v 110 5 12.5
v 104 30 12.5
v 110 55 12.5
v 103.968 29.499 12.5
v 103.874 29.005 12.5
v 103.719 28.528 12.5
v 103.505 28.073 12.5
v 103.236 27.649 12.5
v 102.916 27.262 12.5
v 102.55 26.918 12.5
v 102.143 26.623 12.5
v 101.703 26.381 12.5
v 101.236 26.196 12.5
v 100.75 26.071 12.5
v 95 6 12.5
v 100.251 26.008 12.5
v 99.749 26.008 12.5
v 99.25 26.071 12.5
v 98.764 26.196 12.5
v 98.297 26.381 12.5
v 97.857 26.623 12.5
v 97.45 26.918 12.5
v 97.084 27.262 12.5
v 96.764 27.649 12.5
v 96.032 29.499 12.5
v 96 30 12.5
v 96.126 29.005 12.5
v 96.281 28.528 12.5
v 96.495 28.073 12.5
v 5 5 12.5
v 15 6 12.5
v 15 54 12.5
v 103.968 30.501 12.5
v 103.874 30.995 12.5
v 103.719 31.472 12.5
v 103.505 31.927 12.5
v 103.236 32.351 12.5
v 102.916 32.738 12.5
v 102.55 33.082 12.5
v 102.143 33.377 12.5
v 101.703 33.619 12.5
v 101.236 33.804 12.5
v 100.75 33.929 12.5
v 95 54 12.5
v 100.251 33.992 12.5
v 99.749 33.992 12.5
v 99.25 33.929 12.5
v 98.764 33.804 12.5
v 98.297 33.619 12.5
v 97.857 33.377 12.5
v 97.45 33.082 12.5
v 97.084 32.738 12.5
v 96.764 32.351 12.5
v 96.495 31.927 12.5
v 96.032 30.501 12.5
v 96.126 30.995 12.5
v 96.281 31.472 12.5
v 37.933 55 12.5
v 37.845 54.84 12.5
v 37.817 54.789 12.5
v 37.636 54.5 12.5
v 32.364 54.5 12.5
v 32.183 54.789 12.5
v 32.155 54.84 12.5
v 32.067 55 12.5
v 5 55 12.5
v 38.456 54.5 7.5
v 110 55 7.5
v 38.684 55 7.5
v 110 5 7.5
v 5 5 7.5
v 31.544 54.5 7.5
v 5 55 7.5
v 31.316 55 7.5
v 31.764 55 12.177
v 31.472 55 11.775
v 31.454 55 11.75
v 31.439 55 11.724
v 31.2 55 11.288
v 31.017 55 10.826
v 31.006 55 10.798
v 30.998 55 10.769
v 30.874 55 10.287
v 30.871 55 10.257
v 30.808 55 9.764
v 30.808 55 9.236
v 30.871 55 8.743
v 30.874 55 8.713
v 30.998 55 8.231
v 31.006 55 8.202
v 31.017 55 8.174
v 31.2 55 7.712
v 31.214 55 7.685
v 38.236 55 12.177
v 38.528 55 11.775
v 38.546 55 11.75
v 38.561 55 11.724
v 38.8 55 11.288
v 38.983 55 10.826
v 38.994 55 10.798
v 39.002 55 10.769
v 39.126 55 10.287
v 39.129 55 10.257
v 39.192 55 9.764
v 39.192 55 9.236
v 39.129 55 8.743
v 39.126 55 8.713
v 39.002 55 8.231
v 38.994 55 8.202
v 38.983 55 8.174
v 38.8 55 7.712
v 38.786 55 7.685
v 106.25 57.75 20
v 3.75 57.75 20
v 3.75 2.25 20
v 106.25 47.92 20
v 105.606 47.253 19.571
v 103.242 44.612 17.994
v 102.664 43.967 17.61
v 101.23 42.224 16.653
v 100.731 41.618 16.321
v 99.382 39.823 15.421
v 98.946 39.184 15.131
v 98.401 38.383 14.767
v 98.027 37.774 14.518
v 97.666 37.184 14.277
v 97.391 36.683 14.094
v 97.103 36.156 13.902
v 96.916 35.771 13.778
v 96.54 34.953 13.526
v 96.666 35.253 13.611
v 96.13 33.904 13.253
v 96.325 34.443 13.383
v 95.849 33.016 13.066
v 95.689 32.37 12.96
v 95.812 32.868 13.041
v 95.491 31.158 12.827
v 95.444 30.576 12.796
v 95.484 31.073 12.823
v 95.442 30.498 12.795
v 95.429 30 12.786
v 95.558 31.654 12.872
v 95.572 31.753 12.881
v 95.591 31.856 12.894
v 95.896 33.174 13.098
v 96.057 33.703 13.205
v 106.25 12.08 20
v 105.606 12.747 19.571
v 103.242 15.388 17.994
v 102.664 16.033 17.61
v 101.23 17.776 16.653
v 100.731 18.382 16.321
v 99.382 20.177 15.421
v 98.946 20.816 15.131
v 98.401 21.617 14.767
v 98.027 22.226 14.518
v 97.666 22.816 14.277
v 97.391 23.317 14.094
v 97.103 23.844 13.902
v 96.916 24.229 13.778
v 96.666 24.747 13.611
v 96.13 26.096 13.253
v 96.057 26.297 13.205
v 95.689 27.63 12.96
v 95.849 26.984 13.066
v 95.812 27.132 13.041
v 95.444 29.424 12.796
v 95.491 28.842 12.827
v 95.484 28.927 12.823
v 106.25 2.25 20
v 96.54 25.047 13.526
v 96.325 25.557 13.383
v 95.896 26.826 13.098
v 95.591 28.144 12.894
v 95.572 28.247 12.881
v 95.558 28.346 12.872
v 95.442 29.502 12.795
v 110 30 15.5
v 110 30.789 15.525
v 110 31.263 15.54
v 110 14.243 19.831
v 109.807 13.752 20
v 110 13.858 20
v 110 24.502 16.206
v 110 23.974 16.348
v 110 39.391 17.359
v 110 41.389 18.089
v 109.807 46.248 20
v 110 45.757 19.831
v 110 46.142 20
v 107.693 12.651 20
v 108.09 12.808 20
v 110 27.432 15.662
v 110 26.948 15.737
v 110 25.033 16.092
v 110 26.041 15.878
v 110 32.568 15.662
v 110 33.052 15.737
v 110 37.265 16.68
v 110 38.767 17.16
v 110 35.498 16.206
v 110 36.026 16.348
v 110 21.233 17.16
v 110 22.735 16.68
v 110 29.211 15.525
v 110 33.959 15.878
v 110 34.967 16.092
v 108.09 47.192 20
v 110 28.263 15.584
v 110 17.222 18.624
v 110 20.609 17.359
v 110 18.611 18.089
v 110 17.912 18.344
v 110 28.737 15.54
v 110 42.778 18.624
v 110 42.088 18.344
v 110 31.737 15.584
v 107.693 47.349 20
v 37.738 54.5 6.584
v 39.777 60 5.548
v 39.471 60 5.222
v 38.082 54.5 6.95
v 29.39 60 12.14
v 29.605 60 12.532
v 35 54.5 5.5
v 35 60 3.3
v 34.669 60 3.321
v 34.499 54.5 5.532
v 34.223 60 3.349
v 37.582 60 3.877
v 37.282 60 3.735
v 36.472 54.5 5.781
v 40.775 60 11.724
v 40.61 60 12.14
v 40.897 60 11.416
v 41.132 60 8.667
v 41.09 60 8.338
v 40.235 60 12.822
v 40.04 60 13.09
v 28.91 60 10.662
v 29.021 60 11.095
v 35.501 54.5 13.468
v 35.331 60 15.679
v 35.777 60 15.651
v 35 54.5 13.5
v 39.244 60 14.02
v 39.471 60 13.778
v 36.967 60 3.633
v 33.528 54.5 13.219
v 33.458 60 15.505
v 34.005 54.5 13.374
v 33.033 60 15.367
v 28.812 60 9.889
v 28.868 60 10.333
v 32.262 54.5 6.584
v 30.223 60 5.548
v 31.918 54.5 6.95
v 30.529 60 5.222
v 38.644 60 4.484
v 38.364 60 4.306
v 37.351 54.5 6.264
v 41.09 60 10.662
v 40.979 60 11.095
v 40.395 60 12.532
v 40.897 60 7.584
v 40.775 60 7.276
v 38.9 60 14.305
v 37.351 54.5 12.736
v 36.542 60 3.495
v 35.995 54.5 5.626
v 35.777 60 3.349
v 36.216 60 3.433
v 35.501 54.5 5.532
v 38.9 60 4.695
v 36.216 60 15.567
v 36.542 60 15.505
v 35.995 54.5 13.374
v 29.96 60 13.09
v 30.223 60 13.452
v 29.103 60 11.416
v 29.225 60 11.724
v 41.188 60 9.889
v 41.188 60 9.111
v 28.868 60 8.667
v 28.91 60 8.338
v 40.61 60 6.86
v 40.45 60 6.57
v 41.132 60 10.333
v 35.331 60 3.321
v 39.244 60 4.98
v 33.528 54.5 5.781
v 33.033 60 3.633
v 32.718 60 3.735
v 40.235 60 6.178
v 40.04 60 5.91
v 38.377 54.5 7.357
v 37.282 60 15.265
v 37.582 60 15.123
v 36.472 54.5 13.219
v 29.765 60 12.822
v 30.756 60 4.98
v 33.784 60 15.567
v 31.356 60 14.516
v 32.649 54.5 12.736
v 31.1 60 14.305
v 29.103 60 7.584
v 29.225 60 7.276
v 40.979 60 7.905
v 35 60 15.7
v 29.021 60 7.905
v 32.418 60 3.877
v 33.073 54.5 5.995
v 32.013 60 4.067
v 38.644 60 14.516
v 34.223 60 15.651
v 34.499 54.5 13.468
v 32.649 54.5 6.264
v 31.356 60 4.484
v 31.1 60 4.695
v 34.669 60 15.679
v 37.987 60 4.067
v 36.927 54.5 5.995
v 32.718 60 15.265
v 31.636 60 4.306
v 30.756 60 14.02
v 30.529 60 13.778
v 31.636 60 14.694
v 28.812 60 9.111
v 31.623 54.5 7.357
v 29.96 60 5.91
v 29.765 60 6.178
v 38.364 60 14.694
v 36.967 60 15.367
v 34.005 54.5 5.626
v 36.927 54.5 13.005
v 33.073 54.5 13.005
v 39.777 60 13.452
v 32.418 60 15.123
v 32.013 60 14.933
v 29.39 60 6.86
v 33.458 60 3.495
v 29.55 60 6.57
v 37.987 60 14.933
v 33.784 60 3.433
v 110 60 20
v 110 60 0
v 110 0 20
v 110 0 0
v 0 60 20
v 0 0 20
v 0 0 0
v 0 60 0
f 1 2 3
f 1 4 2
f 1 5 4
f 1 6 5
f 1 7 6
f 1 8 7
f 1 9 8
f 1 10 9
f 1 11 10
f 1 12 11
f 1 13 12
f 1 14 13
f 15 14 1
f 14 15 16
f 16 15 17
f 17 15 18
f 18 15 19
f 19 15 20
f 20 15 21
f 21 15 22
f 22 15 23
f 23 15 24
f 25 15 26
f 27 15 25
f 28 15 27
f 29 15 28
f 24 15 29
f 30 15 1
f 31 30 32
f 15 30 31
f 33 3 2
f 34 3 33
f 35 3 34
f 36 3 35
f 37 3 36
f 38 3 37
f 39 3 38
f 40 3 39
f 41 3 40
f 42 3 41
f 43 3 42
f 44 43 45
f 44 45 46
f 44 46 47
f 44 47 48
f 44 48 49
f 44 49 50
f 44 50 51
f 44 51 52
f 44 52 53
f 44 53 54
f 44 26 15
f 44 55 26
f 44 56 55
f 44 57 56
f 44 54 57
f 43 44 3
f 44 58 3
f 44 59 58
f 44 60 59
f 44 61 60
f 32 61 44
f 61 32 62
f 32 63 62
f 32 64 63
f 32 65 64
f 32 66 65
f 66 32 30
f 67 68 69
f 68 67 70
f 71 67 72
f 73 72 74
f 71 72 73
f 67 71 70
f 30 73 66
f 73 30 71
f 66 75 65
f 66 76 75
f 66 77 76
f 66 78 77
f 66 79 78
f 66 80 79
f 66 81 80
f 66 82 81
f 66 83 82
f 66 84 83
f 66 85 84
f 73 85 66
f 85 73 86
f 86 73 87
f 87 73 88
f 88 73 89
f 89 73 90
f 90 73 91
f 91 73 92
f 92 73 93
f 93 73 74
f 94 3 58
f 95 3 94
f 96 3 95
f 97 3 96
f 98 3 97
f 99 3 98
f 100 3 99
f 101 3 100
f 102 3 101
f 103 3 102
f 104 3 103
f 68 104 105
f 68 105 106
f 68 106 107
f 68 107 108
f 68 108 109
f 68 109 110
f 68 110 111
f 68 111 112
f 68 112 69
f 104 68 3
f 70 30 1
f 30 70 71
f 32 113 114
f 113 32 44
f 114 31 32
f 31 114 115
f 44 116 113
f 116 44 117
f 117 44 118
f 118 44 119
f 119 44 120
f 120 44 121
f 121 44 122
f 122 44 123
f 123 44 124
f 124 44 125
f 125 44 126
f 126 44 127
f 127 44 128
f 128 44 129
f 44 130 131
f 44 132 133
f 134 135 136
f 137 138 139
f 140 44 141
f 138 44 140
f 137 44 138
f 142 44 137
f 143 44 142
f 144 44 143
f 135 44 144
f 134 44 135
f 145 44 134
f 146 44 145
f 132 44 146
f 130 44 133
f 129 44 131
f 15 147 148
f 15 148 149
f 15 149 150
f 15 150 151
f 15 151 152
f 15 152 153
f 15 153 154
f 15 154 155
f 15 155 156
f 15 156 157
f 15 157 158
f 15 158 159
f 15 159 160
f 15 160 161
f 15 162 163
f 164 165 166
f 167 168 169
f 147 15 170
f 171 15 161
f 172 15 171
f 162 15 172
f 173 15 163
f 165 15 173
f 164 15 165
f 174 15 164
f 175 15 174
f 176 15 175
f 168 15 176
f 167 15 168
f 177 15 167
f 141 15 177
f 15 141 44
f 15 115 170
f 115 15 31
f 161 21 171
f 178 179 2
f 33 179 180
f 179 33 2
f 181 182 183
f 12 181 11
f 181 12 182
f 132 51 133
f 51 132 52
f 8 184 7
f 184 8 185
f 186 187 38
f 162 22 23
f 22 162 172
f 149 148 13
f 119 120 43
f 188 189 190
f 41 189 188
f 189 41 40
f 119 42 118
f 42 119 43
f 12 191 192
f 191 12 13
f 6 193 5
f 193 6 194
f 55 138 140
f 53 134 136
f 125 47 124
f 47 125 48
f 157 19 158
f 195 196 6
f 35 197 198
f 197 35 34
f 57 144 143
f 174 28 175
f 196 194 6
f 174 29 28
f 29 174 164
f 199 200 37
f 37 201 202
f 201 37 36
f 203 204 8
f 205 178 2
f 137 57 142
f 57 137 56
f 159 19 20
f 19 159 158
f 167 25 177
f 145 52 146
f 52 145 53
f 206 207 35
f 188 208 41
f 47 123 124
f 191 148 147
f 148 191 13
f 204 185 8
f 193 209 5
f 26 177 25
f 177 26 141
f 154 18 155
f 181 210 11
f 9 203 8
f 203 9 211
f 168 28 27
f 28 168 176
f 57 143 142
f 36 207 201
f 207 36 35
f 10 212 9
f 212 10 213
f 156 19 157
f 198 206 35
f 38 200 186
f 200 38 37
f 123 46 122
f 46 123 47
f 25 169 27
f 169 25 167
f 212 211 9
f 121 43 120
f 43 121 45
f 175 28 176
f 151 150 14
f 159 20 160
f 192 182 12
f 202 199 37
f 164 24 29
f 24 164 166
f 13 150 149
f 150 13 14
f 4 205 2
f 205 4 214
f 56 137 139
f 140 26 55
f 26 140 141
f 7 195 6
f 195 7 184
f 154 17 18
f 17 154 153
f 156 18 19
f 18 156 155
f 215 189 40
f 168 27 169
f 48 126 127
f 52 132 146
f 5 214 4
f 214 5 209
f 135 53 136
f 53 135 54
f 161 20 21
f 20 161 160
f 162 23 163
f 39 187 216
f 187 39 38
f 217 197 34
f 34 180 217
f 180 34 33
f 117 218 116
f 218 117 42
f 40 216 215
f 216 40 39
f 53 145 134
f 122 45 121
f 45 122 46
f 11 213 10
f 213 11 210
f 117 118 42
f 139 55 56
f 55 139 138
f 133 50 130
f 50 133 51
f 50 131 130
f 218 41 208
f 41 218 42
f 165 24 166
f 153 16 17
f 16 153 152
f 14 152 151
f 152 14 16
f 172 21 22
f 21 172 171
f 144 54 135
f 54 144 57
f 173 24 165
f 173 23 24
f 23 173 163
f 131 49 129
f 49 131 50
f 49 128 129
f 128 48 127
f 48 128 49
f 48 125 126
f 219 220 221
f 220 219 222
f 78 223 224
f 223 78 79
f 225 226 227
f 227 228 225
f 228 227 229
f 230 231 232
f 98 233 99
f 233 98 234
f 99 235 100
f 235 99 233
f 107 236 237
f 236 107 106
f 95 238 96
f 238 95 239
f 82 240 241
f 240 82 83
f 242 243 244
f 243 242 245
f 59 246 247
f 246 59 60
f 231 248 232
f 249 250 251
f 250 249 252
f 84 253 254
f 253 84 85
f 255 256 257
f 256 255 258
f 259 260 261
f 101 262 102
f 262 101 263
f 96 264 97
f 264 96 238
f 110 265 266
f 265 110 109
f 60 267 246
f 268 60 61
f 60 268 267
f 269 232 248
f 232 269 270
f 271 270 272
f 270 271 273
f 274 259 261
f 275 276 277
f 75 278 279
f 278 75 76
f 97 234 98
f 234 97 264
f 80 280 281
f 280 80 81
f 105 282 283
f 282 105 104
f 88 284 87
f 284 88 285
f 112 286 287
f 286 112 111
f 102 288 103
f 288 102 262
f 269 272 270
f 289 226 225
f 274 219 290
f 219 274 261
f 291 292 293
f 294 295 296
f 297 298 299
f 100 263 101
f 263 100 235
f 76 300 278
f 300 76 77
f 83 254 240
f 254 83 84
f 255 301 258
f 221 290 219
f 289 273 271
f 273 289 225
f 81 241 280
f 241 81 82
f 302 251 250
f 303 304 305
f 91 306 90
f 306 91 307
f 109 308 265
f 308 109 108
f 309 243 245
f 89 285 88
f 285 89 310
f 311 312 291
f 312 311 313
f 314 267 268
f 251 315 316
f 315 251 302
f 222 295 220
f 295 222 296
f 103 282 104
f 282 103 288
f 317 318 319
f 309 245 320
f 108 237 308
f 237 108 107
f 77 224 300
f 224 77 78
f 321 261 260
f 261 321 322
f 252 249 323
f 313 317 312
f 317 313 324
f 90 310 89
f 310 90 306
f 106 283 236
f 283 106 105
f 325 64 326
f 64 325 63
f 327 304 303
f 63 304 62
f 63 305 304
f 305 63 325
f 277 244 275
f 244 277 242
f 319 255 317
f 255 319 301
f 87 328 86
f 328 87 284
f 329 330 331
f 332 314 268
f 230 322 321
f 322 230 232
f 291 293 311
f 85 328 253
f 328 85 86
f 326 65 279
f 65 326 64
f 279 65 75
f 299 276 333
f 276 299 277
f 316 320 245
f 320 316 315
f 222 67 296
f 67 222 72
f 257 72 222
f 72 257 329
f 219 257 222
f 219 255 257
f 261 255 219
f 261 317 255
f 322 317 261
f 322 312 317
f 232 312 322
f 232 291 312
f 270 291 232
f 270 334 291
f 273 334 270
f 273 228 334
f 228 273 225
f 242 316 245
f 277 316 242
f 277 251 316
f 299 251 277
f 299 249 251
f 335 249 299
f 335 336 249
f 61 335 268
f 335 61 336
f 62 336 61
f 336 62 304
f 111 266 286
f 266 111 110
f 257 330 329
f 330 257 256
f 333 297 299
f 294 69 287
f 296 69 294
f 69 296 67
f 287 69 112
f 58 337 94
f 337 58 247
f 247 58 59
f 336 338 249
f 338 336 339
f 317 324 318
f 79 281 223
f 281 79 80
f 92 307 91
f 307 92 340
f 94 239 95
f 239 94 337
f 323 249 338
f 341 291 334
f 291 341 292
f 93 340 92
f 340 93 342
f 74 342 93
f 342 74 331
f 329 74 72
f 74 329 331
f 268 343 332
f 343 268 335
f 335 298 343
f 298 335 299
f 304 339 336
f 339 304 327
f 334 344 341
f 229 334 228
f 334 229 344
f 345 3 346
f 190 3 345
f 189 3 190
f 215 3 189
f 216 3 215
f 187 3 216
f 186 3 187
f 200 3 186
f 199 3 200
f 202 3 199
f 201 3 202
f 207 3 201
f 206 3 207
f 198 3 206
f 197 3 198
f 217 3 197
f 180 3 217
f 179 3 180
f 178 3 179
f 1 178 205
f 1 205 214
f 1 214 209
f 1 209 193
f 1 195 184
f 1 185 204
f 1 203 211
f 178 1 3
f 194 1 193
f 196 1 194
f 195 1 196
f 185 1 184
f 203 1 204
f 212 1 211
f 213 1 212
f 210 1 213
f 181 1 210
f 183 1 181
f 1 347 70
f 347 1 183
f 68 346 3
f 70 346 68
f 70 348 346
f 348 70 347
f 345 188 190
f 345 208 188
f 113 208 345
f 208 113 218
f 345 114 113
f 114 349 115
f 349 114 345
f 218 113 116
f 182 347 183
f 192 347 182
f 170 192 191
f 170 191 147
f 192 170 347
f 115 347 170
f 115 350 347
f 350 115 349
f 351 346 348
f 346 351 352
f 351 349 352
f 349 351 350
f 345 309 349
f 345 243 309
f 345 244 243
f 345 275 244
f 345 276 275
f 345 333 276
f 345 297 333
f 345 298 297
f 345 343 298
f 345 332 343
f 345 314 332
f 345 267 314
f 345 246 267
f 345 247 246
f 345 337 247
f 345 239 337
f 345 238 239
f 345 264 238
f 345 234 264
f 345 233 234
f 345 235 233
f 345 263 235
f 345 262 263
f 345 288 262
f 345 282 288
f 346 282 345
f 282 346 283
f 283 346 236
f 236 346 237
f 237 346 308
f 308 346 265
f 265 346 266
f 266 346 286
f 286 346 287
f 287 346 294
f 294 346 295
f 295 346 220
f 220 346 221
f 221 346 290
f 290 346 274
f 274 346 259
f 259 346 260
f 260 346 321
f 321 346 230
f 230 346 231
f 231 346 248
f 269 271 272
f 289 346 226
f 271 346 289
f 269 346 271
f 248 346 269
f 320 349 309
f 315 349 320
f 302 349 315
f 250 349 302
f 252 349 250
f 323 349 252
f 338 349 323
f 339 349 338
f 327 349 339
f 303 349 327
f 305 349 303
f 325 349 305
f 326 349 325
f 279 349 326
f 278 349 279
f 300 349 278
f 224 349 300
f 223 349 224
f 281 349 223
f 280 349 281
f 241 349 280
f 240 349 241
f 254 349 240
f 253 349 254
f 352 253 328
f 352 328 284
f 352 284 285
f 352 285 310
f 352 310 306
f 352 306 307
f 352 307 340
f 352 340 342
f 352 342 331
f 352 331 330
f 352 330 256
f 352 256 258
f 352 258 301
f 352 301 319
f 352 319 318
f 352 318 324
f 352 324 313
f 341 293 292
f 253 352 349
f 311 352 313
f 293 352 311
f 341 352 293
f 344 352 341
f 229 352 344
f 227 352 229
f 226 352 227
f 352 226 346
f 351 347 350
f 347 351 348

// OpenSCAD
// file: roundedcube.scad
// More information: https://danielupshaw.com/openscad-rounded-corners/

// Set to 0.01 for higher definition curves (renders slower)
$fs = 0.15;

module roundedcube(size = [1, 1, 1], center = false, radius = 0.5, apply_to = "all") {
	// If single value, convert to [x, y, z] vector
	size = (size[0] == undef) ? [size, size, size] : size;

	translate_min = radius;
	translate_xmax = size[0] - radius;
	translate_ymax = size[1] - radius;
	translate_zmax = size[2] - radius;

	diameter = radius * 2;

	obj_translate = (center == false) ?
		[0, 0, 0] : [
			-(size[0] / 2),
			-(size[1] / 2),
			-(size[2] / 2)
		];

	translate(v = obj_translate) {
		hull() {
			for (translate_x = [translate_min, translate_xmax]) {
				x_at = (translate_x == translate_min) ? "min" : "max";
				for (translate_y = [translate_min, translate_ymax]) {
					y_at = (translate_y == translate_min) ? "min" : "max";
					for (translate_z = [translate_min, translate_zmax]) {
						z_at = (translate_z == translate_min) ? "min" : "max";

						translate(v = [translate_x, translate_y, translate_z])
						if (
							(apply_to == "all") ||
							(apply_to == "xmin" && x_at == "min") || (apply_to == "xmax" && x_at == "max") ||
							(apply_to == "ymin" && y_at == "min") || (apply_to == "ymax" && y_at == "max") ||
							(apply_to == "zmin" && z_at == "min") || (apply_to == "zmax" && z_at == "max")
						) {
							sphere(r = radius);
						} else {
							rotate = 
								(apply_to == "xmin" || apply_to == "xmax" || apply_to == "x") ? [0, 90, 0] : (
								(apply_to == "ymin" || apply_to == "ymax" || apply_to == "y") ? [90, 90, 0] :
								[0, 0, 0]
							);
							rotate(a = rotate)
							cylinder(h = diameter, r = radius, center = true);
						}
					}
				}
			}
		}
	}
}
// main file
include <roundedcube.scad>;


$fn = 50;

//PHONE VARIABLES
phoneSize = [100,50,5];
phoneScreenSize = [80,48,50];
phoneScreenPosition = [10,1];
unlockPhoneSize =[4,50];//r,h
unlockScreenButtonPosition = [95,25]; //x,y
lateralUnlockSize=[4,50];//r,h
lateralUnlockPosition=[30,49.5];

//DASH VARIABLES

dashSize = [110,60,20];
dashHull = [150,50];


fullPiece();



module fullPiece(){
    difference() {
        dash();
        translate([dashSize[0]/2 - phoneSize[0]/2,dashSize[1]/2 - phoneSize[1]/2,dashSize[2]/2 - phoneSize[2]/2]) phone();
    }
}



module dash() {
    //roundedcube(size=dashSize,center=false, radius=1);
    cube(size=dashSize,center=false, radius=1);
}

module phone() {
            cube([phoneSize[0]+50,phoneSize[1],phoneSize[2]]);
    
            color("RED"){
                translate([phoneScreenPosition[0],phoneScreenPosition[1],phoneSize[2]]) {
                    hull(){
                        cube([phoneScreenSize[0],phoneScreenSize[1],1]);
                        translate([0-dashHull[0]/2,0-dashHull[1]/2,phoneScreenSize[2]]) cube([phoneScreenSize[0]+dashHull[0],phoneScreenSize[1]+dashHull[1],1]);
                    }
                }
            }
        
            color("GREEN"){
                translate([unlockScreenButtonPosition[0],unlockScreenButtonPosition[1],phoneSize[2]]) cylinder(unlockPhoneSize[1],unlockPhoneSize[0], unlockPhoneSize[0]+100);
            }
            
            color("BLUE"){
                
                translate([lateralUnlockPosition[0],lateralUnlockPosition[1],lateralUnlockSize[0]/2]) rotate([0,90,90]) cylinder(lateralUnlockSize[1],lateralUnlockSize[0],lateralUnlockSize[0]+20,center=false);
            }
            
    
}

module rounded_square( width, radius_corner ) {
	translate( [ radius_corner, radius_corner, 0 ] )
		minkowski() {
			square( width - 2 * radius_corner );
			circle( radius_corner );
		}
}
